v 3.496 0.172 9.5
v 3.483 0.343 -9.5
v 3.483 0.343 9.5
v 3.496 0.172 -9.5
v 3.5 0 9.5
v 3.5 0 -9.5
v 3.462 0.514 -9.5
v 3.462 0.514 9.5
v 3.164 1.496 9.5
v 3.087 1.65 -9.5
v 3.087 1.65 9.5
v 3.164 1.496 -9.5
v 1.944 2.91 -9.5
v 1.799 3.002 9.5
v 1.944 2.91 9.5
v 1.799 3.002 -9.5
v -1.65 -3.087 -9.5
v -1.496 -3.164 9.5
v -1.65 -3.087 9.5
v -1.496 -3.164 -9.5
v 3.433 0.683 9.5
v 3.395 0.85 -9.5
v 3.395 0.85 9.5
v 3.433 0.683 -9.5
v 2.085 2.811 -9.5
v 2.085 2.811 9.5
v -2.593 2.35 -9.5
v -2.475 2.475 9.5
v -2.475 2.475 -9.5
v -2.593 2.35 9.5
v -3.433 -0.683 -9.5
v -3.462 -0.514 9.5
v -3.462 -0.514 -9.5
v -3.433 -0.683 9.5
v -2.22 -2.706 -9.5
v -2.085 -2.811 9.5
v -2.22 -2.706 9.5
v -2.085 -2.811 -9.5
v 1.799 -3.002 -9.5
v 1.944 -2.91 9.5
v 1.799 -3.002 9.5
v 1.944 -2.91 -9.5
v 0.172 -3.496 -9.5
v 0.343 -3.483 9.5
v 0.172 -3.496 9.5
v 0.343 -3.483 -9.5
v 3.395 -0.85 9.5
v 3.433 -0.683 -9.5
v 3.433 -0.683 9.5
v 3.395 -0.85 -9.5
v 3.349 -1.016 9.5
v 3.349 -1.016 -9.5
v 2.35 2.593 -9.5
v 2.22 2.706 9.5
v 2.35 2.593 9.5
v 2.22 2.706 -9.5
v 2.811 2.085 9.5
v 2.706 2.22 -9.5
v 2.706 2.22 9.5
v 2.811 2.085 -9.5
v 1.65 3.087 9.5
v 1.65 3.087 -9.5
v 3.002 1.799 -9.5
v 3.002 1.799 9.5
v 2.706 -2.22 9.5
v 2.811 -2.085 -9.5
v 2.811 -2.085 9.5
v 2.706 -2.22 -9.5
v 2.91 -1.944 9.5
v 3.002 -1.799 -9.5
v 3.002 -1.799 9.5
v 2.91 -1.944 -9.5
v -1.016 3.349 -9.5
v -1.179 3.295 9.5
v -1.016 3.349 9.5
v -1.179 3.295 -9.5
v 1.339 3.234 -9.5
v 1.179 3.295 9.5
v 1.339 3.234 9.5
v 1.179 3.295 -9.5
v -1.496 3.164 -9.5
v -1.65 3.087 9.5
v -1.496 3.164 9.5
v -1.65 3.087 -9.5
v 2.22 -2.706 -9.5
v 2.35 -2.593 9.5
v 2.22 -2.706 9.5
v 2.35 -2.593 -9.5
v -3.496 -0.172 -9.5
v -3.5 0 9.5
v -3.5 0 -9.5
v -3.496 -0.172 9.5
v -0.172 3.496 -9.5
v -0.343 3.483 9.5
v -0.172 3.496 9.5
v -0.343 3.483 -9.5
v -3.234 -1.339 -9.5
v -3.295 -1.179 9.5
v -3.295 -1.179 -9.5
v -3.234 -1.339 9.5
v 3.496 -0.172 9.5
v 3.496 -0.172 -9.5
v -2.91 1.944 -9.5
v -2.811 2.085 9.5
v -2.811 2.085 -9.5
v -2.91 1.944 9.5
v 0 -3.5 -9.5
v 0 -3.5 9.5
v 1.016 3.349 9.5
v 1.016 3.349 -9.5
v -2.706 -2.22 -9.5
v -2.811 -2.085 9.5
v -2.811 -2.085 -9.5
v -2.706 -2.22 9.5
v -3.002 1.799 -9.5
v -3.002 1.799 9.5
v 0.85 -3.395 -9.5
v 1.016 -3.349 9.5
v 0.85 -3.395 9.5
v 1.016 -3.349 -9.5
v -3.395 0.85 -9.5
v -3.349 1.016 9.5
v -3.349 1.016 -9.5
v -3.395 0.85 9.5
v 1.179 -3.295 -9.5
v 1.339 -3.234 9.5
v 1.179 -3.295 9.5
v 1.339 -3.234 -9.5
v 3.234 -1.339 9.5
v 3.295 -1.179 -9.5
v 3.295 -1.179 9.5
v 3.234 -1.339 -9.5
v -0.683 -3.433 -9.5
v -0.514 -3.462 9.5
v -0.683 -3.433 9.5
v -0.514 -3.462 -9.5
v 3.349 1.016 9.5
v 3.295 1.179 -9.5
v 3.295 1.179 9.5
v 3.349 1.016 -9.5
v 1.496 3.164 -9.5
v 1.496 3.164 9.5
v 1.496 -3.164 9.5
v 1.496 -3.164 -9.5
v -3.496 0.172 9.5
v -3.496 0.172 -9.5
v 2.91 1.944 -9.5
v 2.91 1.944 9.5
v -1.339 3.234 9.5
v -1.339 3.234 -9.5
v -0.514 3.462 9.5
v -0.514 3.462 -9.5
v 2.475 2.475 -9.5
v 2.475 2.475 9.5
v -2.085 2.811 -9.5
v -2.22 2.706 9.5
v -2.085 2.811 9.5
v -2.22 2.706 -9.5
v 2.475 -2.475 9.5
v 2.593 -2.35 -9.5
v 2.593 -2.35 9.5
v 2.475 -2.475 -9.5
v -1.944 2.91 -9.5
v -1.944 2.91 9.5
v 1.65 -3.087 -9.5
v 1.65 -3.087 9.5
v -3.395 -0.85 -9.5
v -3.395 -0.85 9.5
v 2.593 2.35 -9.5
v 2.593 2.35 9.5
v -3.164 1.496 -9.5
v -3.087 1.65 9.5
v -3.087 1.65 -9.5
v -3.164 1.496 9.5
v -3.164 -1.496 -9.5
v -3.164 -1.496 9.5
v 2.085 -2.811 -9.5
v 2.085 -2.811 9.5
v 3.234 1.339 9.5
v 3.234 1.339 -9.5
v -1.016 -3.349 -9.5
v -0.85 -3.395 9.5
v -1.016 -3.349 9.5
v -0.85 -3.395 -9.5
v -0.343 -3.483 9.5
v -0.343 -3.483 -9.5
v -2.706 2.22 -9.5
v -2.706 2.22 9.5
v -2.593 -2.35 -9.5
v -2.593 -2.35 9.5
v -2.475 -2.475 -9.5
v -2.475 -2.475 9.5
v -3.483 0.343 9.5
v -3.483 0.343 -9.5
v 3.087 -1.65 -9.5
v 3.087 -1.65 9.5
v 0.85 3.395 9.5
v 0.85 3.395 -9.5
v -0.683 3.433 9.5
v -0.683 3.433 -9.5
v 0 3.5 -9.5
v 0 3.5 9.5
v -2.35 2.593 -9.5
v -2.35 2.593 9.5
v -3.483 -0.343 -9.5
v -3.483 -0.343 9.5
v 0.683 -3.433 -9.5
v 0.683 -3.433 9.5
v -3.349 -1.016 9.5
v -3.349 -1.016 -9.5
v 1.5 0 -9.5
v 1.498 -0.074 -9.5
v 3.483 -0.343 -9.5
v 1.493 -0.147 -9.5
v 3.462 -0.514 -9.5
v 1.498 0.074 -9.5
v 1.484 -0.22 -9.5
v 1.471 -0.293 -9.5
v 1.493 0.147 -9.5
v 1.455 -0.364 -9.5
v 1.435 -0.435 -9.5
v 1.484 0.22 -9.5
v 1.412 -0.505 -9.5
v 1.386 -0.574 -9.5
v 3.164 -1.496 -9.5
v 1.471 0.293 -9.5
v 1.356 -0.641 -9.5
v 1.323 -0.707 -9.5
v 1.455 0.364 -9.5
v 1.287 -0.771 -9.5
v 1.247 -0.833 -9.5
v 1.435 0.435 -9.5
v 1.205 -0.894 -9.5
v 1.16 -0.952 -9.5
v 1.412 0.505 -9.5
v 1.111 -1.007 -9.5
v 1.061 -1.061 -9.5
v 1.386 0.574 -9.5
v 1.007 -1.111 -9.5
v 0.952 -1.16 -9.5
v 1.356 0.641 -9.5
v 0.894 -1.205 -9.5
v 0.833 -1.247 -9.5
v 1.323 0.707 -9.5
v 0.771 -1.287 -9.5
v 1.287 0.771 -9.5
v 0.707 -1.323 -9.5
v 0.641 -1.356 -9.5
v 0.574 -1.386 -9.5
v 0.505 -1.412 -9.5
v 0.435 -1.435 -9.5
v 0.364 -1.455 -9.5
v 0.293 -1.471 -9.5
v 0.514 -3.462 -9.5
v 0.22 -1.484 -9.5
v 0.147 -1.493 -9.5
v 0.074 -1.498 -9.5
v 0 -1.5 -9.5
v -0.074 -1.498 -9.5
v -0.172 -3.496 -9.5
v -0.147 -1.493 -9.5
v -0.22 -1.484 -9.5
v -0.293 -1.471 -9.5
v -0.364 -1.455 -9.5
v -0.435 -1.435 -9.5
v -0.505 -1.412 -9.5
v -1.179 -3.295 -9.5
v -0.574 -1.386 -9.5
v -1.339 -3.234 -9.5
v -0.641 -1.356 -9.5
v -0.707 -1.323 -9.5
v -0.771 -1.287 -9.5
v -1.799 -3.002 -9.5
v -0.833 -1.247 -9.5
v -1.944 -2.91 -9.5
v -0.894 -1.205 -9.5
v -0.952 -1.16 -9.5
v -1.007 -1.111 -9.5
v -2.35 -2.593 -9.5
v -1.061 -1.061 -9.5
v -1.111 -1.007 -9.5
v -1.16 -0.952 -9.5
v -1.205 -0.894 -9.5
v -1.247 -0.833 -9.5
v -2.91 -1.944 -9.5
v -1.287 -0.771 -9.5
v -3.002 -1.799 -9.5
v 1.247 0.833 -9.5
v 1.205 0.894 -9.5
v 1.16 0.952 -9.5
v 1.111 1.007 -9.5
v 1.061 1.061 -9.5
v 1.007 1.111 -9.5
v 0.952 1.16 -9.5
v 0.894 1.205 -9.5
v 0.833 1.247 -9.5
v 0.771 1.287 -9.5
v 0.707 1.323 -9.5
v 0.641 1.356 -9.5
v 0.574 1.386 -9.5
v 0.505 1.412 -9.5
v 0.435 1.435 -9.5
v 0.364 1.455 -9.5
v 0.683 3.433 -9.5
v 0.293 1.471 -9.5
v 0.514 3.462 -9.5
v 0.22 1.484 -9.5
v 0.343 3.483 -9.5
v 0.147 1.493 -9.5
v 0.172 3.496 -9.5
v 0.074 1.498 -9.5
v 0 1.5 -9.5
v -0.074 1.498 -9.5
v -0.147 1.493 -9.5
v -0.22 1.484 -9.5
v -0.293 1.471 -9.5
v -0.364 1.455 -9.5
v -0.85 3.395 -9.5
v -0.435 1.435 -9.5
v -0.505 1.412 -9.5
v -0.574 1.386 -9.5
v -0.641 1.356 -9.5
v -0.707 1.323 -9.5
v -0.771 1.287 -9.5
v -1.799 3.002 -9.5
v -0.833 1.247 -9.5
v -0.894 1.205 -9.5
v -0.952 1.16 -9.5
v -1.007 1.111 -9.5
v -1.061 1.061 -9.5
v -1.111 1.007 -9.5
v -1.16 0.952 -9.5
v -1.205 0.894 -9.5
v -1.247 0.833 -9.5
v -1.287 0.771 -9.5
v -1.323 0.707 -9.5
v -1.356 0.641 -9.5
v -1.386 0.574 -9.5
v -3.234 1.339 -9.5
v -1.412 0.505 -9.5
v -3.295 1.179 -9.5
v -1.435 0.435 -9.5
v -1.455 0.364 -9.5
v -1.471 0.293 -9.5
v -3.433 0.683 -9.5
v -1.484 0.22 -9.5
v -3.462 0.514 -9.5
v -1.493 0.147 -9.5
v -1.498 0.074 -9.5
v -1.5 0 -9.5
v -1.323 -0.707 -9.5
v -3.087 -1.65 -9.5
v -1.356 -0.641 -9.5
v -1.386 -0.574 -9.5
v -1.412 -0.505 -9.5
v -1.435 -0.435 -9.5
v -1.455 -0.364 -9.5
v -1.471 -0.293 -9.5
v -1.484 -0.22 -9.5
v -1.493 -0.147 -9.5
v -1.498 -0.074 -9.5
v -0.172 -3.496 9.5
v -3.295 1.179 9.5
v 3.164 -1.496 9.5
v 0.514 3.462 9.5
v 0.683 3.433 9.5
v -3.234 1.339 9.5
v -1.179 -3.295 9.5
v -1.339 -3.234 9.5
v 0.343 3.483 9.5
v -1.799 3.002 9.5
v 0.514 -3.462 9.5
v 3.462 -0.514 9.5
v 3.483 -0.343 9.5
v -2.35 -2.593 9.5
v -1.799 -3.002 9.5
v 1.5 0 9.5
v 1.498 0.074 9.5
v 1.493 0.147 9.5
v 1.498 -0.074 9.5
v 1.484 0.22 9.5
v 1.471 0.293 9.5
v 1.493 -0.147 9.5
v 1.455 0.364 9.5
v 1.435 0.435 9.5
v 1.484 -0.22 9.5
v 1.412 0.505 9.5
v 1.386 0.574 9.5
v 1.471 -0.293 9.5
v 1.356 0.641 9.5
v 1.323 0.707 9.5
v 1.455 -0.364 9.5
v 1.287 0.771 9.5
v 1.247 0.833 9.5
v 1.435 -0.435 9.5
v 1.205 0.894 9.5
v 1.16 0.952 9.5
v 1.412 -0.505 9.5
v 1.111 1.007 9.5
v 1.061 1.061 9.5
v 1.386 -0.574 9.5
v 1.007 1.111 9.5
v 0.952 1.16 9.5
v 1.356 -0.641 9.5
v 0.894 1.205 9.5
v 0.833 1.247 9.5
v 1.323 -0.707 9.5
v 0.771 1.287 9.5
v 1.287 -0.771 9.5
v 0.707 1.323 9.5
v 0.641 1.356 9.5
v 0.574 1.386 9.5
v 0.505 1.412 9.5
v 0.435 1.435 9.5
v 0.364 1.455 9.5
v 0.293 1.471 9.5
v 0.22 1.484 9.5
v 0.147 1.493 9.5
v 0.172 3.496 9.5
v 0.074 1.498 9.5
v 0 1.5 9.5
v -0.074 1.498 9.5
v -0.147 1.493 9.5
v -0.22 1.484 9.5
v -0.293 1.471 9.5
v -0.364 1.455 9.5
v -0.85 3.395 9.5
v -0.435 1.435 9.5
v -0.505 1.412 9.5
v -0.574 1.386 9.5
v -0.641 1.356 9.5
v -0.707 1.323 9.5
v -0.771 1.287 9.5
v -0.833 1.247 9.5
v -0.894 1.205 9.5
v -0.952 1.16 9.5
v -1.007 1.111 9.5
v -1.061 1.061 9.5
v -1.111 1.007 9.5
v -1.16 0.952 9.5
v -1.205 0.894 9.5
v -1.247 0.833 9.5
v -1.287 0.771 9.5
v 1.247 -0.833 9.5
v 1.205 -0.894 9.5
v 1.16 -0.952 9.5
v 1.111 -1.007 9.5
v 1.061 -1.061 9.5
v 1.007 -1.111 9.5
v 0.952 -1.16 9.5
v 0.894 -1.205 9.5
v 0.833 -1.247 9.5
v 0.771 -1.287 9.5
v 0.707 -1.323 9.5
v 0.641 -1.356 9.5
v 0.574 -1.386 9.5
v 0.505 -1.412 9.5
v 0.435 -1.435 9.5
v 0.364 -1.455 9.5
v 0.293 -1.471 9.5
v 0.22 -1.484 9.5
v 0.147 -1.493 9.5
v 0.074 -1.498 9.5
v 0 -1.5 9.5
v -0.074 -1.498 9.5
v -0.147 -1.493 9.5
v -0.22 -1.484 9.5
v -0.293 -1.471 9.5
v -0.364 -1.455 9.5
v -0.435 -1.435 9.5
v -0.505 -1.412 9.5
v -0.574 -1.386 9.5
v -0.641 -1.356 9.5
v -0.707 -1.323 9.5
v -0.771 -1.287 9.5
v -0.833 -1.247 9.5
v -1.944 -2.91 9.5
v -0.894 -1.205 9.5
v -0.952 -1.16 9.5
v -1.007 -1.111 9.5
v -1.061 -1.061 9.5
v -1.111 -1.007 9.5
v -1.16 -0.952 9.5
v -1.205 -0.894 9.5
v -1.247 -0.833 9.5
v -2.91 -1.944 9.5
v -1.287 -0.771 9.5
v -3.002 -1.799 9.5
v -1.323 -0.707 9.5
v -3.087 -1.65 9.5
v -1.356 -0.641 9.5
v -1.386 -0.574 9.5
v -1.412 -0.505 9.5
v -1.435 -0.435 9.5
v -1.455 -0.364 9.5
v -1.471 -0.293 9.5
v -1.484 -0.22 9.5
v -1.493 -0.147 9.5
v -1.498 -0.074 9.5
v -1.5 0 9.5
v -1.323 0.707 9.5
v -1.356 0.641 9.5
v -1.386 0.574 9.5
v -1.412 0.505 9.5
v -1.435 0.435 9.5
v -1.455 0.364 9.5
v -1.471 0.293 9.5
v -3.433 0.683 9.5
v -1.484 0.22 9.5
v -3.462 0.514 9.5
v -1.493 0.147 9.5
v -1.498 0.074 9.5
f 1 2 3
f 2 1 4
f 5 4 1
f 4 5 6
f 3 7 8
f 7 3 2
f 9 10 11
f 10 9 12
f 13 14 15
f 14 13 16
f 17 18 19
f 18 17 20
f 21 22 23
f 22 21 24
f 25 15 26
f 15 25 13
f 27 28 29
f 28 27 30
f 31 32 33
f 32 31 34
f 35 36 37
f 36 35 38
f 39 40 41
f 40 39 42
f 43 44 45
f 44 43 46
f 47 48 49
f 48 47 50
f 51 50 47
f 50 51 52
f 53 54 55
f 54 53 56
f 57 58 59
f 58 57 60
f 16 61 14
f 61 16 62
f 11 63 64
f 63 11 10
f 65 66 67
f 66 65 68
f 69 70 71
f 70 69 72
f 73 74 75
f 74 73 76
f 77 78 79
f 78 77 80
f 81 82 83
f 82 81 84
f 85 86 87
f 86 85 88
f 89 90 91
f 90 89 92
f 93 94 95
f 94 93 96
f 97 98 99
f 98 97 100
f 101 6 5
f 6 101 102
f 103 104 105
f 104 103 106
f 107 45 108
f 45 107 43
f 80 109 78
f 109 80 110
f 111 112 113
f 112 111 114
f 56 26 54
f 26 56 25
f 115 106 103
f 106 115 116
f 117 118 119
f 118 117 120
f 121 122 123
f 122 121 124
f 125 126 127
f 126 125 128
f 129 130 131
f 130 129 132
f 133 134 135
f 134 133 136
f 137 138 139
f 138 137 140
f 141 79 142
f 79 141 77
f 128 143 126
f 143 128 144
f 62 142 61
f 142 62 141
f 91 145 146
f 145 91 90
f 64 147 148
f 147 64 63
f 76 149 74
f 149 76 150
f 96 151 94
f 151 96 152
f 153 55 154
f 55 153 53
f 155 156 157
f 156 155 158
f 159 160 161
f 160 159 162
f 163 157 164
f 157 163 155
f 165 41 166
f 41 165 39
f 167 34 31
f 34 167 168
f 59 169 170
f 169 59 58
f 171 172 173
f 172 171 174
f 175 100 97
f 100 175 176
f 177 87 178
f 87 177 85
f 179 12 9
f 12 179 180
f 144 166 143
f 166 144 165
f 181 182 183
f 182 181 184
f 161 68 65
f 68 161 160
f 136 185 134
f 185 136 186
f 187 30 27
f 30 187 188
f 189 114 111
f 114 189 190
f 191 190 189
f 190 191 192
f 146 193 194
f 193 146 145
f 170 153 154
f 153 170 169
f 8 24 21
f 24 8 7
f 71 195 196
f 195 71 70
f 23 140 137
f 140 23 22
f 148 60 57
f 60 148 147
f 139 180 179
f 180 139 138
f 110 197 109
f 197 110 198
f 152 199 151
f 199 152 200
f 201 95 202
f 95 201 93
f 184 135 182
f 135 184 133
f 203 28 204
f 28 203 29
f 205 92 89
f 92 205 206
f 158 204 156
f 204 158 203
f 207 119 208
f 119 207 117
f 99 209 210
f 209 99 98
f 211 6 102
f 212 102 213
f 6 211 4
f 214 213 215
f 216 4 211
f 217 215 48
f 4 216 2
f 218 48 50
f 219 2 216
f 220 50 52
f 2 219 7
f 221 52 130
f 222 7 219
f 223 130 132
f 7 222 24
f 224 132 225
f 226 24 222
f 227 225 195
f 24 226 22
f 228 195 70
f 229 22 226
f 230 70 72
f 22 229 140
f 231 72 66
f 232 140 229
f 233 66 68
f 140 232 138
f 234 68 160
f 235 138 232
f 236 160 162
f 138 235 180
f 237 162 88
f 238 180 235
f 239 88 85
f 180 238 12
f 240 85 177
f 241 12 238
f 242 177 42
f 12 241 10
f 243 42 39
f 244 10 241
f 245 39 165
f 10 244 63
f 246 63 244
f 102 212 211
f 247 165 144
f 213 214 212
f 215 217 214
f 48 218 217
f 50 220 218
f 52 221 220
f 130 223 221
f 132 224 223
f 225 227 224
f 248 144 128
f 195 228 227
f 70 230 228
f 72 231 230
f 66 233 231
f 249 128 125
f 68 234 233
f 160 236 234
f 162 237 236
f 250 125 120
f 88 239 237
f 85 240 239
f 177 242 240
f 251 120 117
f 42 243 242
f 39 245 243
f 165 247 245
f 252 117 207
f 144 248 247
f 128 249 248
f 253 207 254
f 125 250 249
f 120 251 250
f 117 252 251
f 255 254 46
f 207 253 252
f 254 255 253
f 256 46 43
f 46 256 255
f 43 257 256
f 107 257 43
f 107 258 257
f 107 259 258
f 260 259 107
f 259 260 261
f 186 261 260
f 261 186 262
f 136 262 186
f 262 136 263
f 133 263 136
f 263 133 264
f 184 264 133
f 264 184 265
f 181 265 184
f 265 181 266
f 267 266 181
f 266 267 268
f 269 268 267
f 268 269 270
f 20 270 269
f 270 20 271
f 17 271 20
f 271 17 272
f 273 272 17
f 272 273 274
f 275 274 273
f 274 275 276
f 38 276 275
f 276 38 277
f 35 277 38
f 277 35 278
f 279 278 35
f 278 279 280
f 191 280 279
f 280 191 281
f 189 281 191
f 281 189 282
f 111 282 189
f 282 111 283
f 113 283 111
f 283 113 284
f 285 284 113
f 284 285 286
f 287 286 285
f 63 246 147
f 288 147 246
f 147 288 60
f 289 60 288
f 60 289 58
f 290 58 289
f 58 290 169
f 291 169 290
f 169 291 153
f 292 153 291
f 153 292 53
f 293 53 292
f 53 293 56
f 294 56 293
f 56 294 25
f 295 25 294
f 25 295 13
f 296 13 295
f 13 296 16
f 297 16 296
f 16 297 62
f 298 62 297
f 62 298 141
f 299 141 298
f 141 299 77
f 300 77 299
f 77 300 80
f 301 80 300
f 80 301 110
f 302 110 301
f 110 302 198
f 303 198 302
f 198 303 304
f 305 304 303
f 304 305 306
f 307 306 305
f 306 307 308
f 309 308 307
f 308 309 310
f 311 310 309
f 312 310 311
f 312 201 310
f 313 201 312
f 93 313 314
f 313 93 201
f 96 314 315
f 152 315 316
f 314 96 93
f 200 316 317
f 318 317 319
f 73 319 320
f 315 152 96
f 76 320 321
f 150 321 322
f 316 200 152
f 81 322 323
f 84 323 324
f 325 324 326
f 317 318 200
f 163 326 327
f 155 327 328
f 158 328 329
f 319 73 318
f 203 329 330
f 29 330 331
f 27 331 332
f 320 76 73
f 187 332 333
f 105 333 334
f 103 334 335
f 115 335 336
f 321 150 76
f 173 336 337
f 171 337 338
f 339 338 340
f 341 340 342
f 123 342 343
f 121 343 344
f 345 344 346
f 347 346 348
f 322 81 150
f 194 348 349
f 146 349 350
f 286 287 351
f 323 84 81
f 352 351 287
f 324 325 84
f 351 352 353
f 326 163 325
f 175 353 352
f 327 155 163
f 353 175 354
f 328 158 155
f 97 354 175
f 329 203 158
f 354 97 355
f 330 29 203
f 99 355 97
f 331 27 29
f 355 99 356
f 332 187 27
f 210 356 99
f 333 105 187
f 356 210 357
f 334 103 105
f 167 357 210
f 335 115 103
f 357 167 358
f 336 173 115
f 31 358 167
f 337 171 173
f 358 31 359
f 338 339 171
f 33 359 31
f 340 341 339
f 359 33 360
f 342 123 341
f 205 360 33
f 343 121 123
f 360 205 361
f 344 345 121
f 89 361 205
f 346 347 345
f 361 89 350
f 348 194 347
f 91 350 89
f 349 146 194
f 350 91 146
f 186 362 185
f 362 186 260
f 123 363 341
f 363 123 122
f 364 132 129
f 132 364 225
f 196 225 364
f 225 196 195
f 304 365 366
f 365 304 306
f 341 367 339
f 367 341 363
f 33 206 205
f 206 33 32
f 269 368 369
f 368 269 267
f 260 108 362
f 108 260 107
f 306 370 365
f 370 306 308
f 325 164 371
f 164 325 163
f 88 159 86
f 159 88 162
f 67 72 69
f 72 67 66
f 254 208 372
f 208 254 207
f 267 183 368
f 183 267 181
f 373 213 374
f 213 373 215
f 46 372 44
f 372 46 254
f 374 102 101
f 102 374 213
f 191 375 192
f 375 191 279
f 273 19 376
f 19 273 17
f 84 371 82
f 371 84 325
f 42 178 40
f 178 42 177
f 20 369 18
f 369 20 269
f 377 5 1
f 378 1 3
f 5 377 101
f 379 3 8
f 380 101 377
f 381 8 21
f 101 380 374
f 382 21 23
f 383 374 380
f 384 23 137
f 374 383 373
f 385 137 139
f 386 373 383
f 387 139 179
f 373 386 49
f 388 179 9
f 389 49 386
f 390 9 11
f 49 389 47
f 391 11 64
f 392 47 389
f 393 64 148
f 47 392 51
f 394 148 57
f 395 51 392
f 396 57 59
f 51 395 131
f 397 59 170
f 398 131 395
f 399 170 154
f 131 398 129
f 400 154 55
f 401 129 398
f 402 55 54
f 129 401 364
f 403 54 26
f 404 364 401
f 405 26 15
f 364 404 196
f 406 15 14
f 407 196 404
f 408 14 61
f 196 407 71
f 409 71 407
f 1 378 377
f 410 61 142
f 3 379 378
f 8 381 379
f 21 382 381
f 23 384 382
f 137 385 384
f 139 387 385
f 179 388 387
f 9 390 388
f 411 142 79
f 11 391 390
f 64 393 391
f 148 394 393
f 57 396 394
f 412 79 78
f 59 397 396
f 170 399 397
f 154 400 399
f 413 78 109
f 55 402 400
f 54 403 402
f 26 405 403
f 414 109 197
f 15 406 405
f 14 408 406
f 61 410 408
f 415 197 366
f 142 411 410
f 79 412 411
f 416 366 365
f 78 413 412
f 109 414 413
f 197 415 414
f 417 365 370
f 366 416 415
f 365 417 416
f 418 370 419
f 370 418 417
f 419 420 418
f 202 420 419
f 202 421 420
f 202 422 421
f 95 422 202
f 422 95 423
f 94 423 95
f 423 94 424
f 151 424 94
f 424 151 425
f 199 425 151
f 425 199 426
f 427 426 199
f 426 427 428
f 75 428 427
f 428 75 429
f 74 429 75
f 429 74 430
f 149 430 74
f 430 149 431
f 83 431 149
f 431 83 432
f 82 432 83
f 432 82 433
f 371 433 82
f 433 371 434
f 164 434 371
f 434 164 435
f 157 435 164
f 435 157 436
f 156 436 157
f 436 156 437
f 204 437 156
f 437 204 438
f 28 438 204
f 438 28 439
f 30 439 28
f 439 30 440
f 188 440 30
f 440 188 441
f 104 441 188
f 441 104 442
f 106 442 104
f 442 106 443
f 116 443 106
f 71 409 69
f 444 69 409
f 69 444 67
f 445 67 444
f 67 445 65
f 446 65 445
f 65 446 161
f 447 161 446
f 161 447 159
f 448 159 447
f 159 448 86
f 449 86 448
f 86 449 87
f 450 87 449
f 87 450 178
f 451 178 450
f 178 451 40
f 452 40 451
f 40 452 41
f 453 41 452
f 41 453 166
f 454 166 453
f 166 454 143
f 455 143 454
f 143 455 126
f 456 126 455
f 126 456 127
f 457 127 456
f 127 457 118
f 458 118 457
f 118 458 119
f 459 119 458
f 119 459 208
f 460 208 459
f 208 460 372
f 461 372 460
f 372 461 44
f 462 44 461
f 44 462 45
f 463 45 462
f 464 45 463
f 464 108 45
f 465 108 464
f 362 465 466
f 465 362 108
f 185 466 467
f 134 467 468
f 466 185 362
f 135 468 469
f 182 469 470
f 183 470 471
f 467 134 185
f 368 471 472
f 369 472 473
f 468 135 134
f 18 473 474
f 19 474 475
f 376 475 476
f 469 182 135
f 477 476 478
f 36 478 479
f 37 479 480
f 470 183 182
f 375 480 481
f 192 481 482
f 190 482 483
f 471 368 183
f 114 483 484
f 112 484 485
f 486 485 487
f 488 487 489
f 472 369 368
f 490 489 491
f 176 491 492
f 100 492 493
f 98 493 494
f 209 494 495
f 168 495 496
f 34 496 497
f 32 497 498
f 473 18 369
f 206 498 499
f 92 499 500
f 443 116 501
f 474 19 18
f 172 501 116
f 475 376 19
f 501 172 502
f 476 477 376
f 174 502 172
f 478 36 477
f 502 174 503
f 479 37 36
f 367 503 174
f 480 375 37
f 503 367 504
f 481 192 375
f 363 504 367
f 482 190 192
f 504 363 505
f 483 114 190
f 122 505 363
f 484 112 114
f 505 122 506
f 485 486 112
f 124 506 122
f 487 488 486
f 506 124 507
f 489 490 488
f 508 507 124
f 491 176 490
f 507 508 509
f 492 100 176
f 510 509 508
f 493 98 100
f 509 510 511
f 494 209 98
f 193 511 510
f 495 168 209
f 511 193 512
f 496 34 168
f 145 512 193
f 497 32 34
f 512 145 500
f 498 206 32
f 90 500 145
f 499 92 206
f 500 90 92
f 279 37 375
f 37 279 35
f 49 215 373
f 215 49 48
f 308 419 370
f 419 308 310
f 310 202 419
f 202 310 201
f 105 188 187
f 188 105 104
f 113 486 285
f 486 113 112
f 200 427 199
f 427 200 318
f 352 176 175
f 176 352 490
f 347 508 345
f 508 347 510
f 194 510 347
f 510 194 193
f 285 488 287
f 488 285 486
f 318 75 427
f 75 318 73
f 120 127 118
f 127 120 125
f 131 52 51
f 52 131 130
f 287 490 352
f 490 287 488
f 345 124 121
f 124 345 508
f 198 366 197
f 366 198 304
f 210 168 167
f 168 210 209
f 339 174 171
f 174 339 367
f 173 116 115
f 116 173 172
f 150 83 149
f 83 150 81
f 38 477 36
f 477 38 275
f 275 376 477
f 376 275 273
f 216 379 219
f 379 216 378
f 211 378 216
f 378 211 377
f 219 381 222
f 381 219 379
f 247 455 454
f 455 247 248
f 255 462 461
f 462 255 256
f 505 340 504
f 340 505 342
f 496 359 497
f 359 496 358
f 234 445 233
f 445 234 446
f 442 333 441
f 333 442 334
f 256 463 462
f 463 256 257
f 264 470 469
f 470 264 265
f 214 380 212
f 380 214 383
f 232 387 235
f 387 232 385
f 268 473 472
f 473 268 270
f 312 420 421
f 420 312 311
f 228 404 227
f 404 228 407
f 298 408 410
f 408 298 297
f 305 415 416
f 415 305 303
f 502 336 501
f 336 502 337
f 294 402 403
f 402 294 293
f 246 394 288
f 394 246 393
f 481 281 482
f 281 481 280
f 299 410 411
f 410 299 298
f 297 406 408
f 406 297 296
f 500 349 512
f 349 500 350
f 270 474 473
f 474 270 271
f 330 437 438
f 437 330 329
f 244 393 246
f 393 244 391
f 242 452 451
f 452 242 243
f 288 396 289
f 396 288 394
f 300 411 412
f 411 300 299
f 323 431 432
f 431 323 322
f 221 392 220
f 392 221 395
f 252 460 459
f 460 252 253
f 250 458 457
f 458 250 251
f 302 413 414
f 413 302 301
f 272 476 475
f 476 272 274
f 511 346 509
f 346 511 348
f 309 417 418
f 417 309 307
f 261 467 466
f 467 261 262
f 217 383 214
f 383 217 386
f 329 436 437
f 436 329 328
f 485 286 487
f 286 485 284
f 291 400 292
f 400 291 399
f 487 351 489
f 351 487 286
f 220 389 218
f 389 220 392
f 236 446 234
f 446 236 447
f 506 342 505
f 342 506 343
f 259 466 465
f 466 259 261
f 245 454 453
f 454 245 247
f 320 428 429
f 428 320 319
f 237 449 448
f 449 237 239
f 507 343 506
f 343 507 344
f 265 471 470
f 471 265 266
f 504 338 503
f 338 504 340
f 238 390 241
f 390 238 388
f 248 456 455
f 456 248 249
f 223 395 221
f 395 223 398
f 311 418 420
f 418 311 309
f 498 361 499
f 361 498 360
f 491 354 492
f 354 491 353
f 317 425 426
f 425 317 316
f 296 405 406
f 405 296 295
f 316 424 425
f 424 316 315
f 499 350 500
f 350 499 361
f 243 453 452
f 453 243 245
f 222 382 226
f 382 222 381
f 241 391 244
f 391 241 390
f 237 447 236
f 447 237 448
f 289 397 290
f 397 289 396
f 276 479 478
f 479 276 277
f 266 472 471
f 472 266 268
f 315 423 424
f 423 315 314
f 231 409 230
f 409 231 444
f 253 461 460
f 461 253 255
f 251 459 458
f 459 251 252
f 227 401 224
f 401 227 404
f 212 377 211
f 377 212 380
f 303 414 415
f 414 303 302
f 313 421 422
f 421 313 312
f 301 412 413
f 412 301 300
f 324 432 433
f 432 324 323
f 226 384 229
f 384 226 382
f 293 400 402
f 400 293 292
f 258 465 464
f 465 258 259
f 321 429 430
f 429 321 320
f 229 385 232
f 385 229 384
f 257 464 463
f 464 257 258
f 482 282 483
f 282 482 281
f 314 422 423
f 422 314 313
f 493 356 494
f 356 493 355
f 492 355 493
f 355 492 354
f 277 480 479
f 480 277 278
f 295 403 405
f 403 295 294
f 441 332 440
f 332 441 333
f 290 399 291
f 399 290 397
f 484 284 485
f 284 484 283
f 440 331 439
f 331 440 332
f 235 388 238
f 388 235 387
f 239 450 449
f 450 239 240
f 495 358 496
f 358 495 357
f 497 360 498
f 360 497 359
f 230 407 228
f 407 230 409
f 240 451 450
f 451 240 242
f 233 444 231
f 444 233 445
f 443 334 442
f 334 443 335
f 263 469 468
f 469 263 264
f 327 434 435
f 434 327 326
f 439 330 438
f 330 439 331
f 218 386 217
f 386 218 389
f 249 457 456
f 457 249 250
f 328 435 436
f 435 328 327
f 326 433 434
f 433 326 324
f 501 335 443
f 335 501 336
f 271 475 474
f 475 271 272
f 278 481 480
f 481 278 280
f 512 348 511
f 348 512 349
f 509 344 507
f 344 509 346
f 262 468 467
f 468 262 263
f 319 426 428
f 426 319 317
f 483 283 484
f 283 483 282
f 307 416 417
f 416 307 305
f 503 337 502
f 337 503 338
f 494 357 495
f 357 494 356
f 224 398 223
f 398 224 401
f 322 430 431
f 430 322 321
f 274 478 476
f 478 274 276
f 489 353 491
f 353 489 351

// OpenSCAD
$fn=128;

module linear_bearing(bore_d=3.0, od_d=7.0, len=19.0) {
    difference() {
        cylinder(d=od_d, h=len, center=true);
        cylinder(d=bore_d, h=len+0.2, center=true);
    }
}

linear_bearing();
